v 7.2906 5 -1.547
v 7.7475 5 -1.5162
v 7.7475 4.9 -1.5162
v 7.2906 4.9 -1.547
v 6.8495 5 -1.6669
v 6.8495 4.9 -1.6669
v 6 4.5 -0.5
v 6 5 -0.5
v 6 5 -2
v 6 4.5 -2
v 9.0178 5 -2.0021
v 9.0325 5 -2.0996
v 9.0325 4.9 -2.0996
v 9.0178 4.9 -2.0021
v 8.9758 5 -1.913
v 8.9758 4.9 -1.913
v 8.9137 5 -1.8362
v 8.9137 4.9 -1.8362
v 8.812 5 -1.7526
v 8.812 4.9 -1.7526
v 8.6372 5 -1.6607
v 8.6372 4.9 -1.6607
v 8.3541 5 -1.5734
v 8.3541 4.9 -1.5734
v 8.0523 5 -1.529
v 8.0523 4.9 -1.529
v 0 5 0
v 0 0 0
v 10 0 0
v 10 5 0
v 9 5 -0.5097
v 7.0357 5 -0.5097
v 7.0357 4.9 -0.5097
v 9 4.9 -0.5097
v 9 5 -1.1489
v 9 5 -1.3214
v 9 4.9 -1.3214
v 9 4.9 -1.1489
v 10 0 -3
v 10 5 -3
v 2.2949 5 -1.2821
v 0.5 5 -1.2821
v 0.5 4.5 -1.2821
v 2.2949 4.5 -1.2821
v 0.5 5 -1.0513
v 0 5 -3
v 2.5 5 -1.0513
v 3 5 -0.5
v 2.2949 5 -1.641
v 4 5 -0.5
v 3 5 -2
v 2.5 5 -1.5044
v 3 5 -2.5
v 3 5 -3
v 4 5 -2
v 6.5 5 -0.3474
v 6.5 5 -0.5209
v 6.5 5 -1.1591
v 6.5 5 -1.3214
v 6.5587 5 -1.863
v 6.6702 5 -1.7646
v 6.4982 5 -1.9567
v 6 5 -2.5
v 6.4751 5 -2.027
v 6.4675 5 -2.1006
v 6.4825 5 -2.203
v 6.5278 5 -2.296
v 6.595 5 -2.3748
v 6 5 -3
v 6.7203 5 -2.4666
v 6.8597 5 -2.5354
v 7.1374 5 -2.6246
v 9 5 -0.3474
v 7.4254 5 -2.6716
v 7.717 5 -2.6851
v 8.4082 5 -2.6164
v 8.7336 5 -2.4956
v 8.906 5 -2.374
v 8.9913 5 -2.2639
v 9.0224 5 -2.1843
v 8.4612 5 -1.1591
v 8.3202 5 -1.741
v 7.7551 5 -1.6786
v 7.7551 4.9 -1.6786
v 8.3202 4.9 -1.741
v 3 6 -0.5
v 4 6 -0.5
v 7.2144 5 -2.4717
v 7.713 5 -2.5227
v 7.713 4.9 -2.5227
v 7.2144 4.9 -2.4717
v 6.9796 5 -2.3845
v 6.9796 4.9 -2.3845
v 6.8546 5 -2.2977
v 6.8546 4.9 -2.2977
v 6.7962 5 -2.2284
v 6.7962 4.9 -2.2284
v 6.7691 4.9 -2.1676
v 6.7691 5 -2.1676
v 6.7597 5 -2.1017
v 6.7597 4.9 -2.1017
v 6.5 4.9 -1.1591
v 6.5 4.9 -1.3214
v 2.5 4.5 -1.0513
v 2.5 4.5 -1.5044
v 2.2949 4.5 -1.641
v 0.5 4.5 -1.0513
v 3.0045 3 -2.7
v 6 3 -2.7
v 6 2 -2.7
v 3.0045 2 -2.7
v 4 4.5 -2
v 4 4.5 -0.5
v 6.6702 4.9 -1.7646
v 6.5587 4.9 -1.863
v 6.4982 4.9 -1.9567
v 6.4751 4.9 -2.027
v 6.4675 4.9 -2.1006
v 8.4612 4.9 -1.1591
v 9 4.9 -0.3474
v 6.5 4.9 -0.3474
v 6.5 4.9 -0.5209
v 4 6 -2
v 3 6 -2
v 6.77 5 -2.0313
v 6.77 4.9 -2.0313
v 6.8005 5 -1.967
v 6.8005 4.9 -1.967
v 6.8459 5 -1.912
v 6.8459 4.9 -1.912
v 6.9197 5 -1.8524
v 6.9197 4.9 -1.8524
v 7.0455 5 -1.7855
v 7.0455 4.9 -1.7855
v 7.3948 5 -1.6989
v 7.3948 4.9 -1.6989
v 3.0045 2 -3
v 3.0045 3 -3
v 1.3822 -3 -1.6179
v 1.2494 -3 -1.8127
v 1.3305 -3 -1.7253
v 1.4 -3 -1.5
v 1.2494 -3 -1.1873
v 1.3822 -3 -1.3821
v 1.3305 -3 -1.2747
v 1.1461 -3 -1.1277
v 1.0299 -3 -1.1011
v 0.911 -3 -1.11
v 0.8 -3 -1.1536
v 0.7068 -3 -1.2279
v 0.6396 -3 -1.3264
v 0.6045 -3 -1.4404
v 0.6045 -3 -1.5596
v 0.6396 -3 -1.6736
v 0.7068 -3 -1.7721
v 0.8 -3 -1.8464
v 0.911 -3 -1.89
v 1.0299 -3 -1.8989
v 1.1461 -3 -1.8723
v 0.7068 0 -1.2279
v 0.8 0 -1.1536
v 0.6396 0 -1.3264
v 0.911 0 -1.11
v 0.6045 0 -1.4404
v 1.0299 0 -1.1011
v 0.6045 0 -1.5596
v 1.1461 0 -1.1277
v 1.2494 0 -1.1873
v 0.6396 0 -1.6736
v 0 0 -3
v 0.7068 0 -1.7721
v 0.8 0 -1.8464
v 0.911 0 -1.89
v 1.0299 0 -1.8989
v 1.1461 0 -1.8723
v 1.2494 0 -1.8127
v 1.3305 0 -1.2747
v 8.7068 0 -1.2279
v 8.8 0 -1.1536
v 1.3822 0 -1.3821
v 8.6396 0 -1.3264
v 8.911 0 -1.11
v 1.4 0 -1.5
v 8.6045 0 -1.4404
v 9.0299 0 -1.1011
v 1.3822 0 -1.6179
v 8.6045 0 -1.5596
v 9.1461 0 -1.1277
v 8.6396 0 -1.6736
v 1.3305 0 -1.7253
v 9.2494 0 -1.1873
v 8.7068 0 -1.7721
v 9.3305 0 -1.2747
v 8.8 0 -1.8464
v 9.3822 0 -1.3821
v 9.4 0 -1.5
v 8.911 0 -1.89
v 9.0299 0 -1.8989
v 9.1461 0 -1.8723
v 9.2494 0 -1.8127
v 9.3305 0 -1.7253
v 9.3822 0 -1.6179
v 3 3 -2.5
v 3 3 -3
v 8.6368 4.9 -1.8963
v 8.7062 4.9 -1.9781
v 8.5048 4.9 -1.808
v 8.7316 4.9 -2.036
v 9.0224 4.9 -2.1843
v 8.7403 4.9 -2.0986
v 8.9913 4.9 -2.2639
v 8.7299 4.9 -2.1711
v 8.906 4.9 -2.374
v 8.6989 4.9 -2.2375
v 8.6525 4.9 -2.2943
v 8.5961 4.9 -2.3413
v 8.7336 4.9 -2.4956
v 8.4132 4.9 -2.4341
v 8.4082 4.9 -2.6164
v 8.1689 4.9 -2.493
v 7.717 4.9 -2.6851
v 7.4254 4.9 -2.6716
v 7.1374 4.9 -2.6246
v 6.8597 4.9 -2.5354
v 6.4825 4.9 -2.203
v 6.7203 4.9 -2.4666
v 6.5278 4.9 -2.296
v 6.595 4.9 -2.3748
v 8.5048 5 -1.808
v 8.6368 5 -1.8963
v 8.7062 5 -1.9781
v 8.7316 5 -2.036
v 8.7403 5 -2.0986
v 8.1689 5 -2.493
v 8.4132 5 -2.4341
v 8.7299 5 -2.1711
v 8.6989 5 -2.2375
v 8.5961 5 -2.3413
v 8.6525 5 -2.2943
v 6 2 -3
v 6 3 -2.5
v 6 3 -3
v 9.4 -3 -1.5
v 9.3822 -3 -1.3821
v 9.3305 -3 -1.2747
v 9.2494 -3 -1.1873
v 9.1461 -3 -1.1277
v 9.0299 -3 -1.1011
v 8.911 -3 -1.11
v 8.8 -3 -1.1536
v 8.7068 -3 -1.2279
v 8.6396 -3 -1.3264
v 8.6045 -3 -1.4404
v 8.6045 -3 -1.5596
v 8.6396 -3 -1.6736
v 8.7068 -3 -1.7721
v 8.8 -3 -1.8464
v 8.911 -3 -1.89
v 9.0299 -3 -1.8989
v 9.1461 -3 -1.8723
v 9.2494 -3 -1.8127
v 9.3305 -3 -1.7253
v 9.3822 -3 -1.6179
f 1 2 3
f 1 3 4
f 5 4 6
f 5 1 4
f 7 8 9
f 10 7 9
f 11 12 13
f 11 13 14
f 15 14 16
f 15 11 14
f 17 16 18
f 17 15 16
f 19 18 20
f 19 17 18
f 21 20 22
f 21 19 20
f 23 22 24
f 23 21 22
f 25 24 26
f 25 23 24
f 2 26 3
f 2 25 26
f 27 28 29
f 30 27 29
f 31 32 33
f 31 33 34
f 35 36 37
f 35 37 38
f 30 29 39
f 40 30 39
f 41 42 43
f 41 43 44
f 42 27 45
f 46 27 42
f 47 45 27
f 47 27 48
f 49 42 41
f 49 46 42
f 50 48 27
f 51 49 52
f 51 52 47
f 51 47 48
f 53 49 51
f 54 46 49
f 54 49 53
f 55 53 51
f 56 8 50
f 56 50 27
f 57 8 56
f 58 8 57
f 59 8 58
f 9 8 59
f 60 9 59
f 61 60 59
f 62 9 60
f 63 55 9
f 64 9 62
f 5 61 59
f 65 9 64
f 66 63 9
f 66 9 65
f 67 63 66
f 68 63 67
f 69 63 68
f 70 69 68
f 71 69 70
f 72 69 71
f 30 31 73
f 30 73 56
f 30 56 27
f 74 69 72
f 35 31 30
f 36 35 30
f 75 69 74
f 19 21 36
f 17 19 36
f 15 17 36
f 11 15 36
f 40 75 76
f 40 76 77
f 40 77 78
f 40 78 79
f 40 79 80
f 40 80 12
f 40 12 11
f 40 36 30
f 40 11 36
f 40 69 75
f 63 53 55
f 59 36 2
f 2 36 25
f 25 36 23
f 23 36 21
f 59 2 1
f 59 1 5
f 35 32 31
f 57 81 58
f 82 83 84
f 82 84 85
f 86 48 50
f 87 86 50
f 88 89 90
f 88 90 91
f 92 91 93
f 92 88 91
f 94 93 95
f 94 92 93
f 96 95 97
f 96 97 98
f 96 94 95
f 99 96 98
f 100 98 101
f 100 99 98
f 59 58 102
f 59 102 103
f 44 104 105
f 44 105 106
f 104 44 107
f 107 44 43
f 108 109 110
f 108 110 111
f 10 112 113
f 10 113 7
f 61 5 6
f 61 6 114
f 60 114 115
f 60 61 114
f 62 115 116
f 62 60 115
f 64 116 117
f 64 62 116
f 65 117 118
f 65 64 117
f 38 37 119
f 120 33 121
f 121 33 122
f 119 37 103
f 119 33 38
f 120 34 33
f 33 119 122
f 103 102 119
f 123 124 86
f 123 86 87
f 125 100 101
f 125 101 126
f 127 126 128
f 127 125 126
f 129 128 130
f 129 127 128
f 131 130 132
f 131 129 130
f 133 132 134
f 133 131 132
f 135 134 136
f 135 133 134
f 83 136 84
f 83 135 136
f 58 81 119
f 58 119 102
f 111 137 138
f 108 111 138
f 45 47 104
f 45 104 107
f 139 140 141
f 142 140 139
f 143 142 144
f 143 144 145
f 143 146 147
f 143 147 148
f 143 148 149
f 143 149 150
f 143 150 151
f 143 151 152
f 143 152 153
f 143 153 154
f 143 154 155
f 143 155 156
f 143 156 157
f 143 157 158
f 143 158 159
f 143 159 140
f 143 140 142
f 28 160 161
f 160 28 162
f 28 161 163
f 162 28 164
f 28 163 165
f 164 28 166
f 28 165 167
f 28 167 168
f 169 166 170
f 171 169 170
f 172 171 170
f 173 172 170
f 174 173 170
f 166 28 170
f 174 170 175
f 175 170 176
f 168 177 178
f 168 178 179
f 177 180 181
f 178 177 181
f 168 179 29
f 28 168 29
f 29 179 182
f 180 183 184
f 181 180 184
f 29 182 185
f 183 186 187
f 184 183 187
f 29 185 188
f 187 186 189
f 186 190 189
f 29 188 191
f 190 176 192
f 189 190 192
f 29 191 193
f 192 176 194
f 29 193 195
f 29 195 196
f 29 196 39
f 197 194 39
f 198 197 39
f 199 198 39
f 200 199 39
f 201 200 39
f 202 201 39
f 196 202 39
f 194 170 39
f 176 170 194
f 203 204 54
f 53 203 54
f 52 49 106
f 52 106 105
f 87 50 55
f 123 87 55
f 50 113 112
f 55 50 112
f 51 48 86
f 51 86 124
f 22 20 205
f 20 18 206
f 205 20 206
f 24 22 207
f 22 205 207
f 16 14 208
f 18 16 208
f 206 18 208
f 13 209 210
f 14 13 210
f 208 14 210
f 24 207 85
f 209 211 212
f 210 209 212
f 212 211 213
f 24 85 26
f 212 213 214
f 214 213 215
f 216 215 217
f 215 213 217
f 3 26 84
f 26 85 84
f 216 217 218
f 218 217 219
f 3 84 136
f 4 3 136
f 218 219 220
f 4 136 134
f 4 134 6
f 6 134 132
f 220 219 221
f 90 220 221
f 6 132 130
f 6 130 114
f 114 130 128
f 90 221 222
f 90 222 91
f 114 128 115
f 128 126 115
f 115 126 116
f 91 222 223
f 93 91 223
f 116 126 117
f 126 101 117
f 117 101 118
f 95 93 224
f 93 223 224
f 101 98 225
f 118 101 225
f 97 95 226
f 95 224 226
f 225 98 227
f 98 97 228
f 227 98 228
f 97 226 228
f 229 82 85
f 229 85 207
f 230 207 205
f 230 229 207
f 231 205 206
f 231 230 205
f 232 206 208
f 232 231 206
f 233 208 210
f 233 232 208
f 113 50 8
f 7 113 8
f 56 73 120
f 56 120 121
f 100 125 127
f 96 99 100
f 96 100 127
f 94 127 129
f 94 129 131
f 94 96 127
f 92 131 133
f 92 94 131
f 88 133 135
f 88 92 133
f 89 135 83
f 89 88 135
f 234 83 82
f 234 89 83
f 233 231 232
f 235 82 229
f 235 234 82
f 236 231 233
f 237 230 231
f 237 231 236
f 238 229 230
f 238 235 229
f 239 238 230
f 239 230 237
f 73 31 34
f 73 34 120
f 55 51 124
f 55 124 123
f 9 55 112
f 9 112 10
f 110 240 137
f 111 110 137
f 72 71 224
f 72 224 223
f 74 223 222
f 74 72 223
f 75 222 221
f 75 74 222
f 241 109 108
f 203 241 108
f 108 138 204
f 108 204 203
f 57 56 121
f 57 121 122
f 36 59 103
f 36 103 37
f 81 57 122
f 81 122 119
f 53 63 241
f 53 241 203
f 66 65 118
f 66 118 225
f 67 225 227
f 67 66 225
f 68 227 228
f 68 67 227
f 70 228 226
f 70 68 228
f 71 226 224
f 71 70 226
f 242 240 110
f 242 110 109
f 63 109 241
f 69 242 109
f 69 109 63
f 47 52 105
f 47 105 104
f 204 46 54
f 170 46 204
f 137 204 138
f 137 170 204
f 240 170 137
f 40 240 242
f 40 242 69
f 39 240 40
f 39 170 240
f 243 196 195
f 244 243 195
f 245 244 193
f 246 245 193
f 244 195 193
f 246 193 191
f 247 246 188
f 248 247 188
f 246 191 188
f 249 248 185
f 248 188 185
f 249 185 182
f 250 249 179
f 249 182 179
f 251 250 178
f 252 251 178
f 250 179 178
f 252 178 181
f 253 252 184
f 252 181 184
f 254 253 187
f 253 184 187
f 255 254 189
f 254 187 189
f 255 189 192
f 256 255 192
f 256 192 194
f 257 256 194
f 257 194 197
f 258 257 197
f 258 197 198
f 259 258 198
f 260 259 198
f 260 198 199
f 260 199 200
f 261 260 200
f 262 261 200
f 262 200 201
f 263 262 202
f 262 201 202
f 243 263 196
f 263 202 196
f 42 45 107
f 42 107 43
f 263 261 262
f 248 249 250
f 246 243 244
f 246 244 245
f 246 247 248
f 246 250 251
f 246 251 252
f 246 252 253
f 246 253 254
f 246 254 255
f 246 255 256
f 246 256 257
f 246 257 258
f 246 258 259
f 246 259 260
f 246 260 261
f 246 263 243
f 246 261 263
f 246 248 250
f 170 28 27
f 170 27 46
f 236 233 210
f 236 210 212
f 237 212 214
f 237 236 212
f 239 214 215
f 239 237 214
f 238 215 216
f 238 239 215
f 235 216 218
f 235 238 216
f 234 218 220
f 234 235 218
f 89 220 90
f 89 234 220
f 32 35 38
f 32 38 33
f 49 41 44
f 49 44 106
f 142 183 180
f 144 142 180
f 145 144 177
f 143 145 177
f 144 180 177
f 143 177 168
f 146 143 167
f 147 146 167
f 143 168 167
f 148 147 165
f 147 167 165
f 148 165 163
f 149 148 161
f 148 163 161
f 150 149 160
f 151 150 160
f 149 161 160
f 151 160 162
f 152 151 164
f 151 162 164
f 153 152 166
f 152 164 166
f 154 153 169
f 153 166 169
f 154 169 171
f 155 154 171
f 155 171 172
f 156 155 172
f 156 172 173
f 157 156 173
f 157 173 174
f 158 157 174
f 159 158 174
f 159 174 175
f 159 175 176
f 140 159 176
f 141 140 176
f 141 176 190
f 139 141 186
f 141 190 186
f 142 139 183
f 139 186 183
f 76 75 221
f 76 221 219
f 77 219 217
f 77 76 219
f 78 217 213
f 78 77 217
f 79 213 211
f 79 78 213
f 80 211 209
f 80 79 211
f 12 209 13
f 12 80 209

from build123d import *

# Parameters (mm, degrees)
ESBO_O1_W                = 10
ESBO_O1_H                = 3
RESSALTO_EXTRUS_O1_DEPTH = 5
ESBO_O4_W                = 1
ESBO_O4_H                = 1.5
RESSALTO_EXTRUS_O2_DEPTH = 1
ESBO_O8_W                = 2
ESBO_O8_H                = 1.5
CORTE_EXTRUS_O2_DEPTH    = 0.5
CORTE_EXTRUS_O5_DEPTH    = 0.1
CORTE_EXTRUS_O6_DEPTH    = 0.5
ESBO_O11_R               = 0.4
RESSALTO_EXTRUS_O4_DEPTH = 3
ESBO_O19_W               = 3
ESBO_O19_H               = 2
CORTE_EXTRUS_O9_DEPTH    = 0.5
ESBO_O21_W               = 2.995544047
ESBO_O21_H               = 1
CORTE_EXTRUS_O10_DEPTH   = 0.3


with BuildPart() as part:
    # Esboço1 → Ressalto-extrusão1 (new body)
    with BuildSketch(Plane(origin=(0, 0, 0), x_dir=(1, 0, 0), z_dir=(0, 1, 0))):
        with Locations((5, 1.5)):
            Rectangle(ESBO_O1_W, ESBO_O1_H)
    extrude(amount=RESSALTO_EXTRUS_O1_DEPTH)

    # Esboço4 → Ressalto-extrusão2 (add)
    with BuildSketch(Plane(origin=(0, 5, 0), x_dir=(1, 0, 0), z_dir=(0, 1, 0))):
        with Locations((3.5, 1.25)):
            Rectangle(ESBO_O4_W, ESBO_O4_H)
    extrude(amount=RESSALTO_EXTRUS_O2_DEPTH)

    # Esboço8 → Corte-extrusão2 (cut)
    with BuildSketch(Plane(origin=(0, 5, 0), x_dir=(1, 0, 0), z_dir=(0, 1, 0))):
        with Locations((5, 1.25)):
            Rectangle(ESBO_O8_W, ESBO_O8_H)
    extrude(amount=-CORTE_EXTRUS_O2_DEPTH, mode=Mode.SUBTRACT)

    # Esboço9 → Corte-extrusão5 (cut)
    with BuildSketch(Plane(origin=(0, 5, 0), x_dir=(1, 0, 0), z_dir=(0, 1, 0))):
        with BuildLine():
            add(Edge.make_bspline(
                [(7.717025162, 2.685064935), (7.768275073, 2.684653139), (7.867968532, 2.683852096), (8.012830606, 2.675522502), (8.148601104, 2.662599241), (8.275087284, 2.644432886), (8.392605867, 2.621489185), (8.500848932, 2.592511147), (8.600323781, 2.558959581), (8.689910066, 2.519182744), (8.770052693, 2.476635016), (8.839594359, 2.430662628), (8.899331263, 2.382896177), (8.947218272, 2.331040045), (8.986118217, 2.27759415), (9.012308422, 2.220411921), (9.029958288, 2.161052106), (9.031626399, 2.120222692), (9.032467532, 2.09963474)],
                knots=[0, 0, 0, 0, 0.000153734, 0.000299051, 0.000435142, 0.000562774, 0.000682263, 0.000794121, 0.000898722, 0.000996847, 0.001087864, 0.001170597, 0.00124666, 0.001316656, 0.001381822, 0.001444006, 0.001504562, 0.001566156, 0.001566156, 0.001566156, 0.001566156], degree=3))
            add(Edge.make_bspline(
                [(9.032467532, 2.09963474), (9.031952466, 2.086243406), (9.03092816, 2.059612265), (9.023519116, 2.020284156), (9.011816828, 1.98174038), (8.994996923, 1.944322939), (8.973326429, 1.907779642), (8.946647613, 1.872377676), (8.91588358, 1.837308554), (8.879929464, 1.803879089), (8.84003574, 1.771271209), (8.79508583, 1.741089795), (8.746201299, 1.712010826), (8.693008442, 1.684722634), (8.635338402, 1.659358364), (8.573479622, 1.635698049), (8.507410398, 1.613183974), (8.437075438, 1.593196089), (8.363020356, 1.57481891), (8.285320249, 1.559134103), (8.204039884, 1.546195816), (8.119518678, 1.534740096), (8.031299129, 1.526956469), (7.939792349, 1.520962638), (7.844740014, 1.516511464), (7.78027454, 1.516327433), (7.747463474, 1.516233766)],
                knots=[0, 0, 0, 0, 4.0157e-05, 7.986e-05, 0.000119657, 0.000160761, 0.00020261, 0.000246848, 0.000293569, 0.000342376, 0.000393954, 0.000447987, 0.000504626, 0.000564524, 0.000627211, 0.000693536, 0.000763161, 0.000836538, 0.000912823, 0.000992017, 0.001074251, 0.001159703, 0.001247841, 0.001339865, 0.001434818, 0.00153324, 0.00153324, 0.00153324, 0.00153324], degree=3))
            add(Edge.make_bspline(
                [(7.747463474, 1.516233766), (7.702642019, 1.51673791), (7.614970919, 1.517724018), (7.486687775, 1.524909023), (7.364657949, 1.536494006), (7.248954096, 1.552416836), (7.139735974, 1.573715014), (7.036976444, 1.599695769), (6.940209946, 1.629432703), (6.87929448, 1.654605061), (6.849533279, 1.666903409)],
                knots=[0, 0, 0, 0, 0.00013446, 0.000263004, 0.000385315, 0.000502115, 0.000613247, 0.000718938, 0.000820018, 0.000916578, 0.000916578, 0.000916578, 0.000916578], degree=3))
            add(Edge.make_bspline(
                [(6.849533279, 1.666903409), (6.819495721, 1.680737693), (6.762099909, 1.707172265), (6.684107261, 1.753561383), (6.617281662, 1.802485084), (6.562765507, 1.855474257), (6.520316361, 1.9119252), (6.489575578, 1.97162645), (6.471096623, 2.035136967), (6.468725659, 2.078717419), (6.467532468, 2.100649351)],
                knots=[0, 0, 0, 0, 9.9153e-05, 0.000189462, 0.000271747, 0.000347082, 0.000416684, 0.000482706, 0.000547582, 0.000613307, 0.000613307, 0.000613307, 0.000613307], degree=3))
            add(Edge.make_bspline(
                [(6.467532468, 2.100649351), (6.468673515, 2.122760058), (6.470934698, 2.166576254), (6.490149361, 2.23047144), (6.521930555, 2.290377771), (6.565195504, 2.347502443), (6.621476513, 2.400294414), (6.689828213, 2.449371296), (6.769790362, 2.49578785), (6.828783463, 2.521791334), (6.859679383, 2.535409903)],
                knots=[0, 0, 0, 0, 6.623e-05, 0.000131246, 0.000198184, 0.000268801, 0.000345229, 0.000428739, 0.000520798, 0.000622027, 0.000622027, 0.000622027, 0.000622027], degree=3))
            add(Edge.make_bspline(
                [(6.859679383, 2.535409903), (6.889983671, 2.547446904), (6.951310735, 2.571806293), (7.047289586, 2.602023308), (7.147652813, 2.628051521), (7.252801276, 2.648342721), (7.36221225, 2.665485653), (7.476356384, 2.676921818), (7.595195642, 2.68340278), (7.675925466, 2.6845042), (7.717025162, 2.685064935)],
                knots=[0, 0, 0, 0, 9.7794e-05, 0.000197907, 0.000301632, 0.000408684, 0.000519032, 0.000633771, 0.000752663, 0.000875964, 0.000875964, 0.000875964, 0.000875964], degree=3))
        make_face()
        with BuildLine():
            add(Edge.make_bspline(
                [(7.712966721, 2.522727273), (7.676265876, 2.522308225), (7.605018602, 2.52149473), (7.50124071, 2.516066621), (7.403787401, 2.506272361), (7.312351828, 2.493718156), (7.227668706, 2.475551712), (7.149030594, 2.455141256), (7.076719376, 2.430343071), (7.011040089, 2.401515886), (6.952378669, 2.370275717), (6.901011675, 2.337541762), (6.858096688, 2.302123084), (6.822086823, 2.265855819), (6.794084242, 2.227459146), (6.774410061, 2.1871143), (6.762168952, 2.14498675), (6.760550491, 2.116116802), (6.75974026, 2.101663961)],
                knots=[0, 0, 0, 0, 0.000110104, 0.000213745, 0.000311623, 0.000403886, 0.000490446, 0.000571292, 0.000647498, 0.000719509, 0.000786234, 0.00084674, 0.000901887, 0.00095283, 0.000999714, 0.00104373, 0.001086934, 0.001130246, 0.001130246, 0.001130246, 0.001130246], degree=3))
            add(Edge.make_bspline(
                [(6.75974026, 2.101663961), (6.760546361, 2.08687607), (6.762147128, 2.057510041), (6.774313031, 2.014588099), (6.794620069, 1.973819375), (6.82312444, 1.935125343), (6.858951297, 1.897980531), (6.902606815, 1.862790076), (6.954424216, 1.830037922), (7.013593655, 1.798559592), (7.080701403, 1.770420052), (7.15507718, 1.745439683), (7.237089191, 1.7250245), (7.326311037, 1.707753487), (7.423058943, 1.694892365), (7.527126513, 1.685211994), (7.638673744, 1.679804459), (7.715497711, 1.678990654), (7.755073052, 1.678571429)],
                knots=[0, 0, 0, 0, 4.4322e-05, 8.8015e-05, 0.00013271, 0.000180302, 0.00023161, 0.00028715, 0.000348081, 0.000415255, 0.000487996, 0.000566123, 0.000650406, 0.000741342, 0.000838628, 0.000943072, 0.001054818, 0.001173545, 0.001173545, 0.001173545, 0.001173545], degree=3))
            add(Edge.make_bspline(
                [(7.755073052, 1.678571429), (7.806337615, 1.67933264), (7.906298407, 1.680816928), (8.051928946, 1.692847075), (8.189578018, 1.711140794), (8.277380562, 1.731189916), (8.320211039, 1.740969968)],
                knots=[0, 0, 0, 0, 0.000153767, 0.00029983, 0.000438153, 0.000569888, 0.000569888, 0.000569888, 0.000569888], degree=3))
            add(Edge.make_bspline(
                [(8.320211039, 1.740969968), (8.350692489, 1.749465777), (8.409390915, 1.765826239), (8.490866203, 1.799714474), (8.563441842, 1.83845794), (8.625079395, 1.883949286), (8.675708543, 1.933016459), (8.713082539, 1.985414753), (8.736039938, 2.041202632), (8.738865882, 2.07965435), (8.74025974, 2.09862013)],
                knots=[0, 0, 0, 0, 9.485e-05, 0.000182653, 0.000264154, 0.000341064, 0.000411733, 0.000474779, 0.000533093, 0.00058985, 0.00058985, 0.00058985, 0.00058985], degree=3))
            add(Edge.make_bspline(
                [(8.74025974, 2.09862013), (8.739452698, 2.113743816), (8.737850374, 2.143770825), (8.725711477, 2.187701113), (8.705482151, 2.229237127), (8.67758473, 2.268647264), (8.642026485, 2.305993002), (8.598385597, 2.341015015), (8.546814492, 2.373728066), (8.487776446, 2.404835686), (8.420389396, 2.432702421), (8.344485848, 2.456804565), (8.260267259, 2.477516021), (8.167366142, 2.493969498), (8.065977549, 2.507157629), (7.955920014, 2.515874448), (7.837316624, 2.521580425), (7.755418511, 2.522335751), (7.712966721, 2.522727273)],
                knots=[0, 0, 0, 0, 4.5332e-05, 9.0004e-05, 0.000135611, 0.000183322, 0.00023428, 0.00028982, 0.000350751, 0.000417239, 0.000489784, 0.000569198, 0.000655941, 0.000749776, 0.000852091, 0.000962554, 0.001080888, 0.001208238, 0.001208238, 0.001208238, 0.001208238], degree=3))
        make_face(mode=Mode.SUBTRACT)
        Polygon((6.5, 1.321428571), (9, 1.321428571), (9, 1.148944805), (7.035714286, 0.50974026), (9, 0.50974026), (9, 0.347402597), (6.5, 0.347402597), (6.5, 0.520900974), (8.461241883, 1.159090909), (6.5, 1.159090909), align=None)
    extrude(amount=-CORTE_EXTRUS_O5_DEPTH, mode=Mode.SUBTRACT)

    # Esboço10 → Corte-extrusão6 (cut)
    with BuildSketch(Plane(origin=(0, 5, 0), x_dir=(1, 0, 0), z_dir=(0, 1, 0))):
        Polygon((2.5, 1.504407051), (2.5, 1.051282051), (0.5, 1.051282051), (0.5, 1.282051282), (2.294871795, 1.282051282), (2.294871795, 1.641025641), align=None)
    extrude(amount=-CORTE_EXTRUS_O6_DEPTH, mode=Mode.SUBTRACT)

    # Esboço11 → Ressalto-extrusão4 (add)
    with BuildSketch(Plane.XZ):
        with Locations((1, -1.5)):
            Circle(ESBO_O11_R)
        with Locations((9, -1.5)):
            Circle(ESBO_O11_R)
    extrude(amount=RESSALTO_EXTRUS_O4_DEPTH)

    # Esboço19 → Corte-extrusão9 (cut)
    with BuildSketch(Plane(origin=(0, 0, -3), x_dir=(-1, 0, 0), z_dir=(0, 0, -1))):
        with Locations((-4.5, 4)):
            Rectangle(ESBO_O19_W, ESBO_O19_H)
    extrude(amount=-CORTE_EXTRUS_O9_DEPTH, mode=Mode.SUBTRACT)

    # Esboço21 → Corte-extrusão10 (cut)
    with BuildSketch(Plane(origin=(0, 0, -3), x_dir=(-1, 0, 0), z_dir=(0, 0, -1))):
        with Locations((-4.502227977, 2.5)):
            Rectangle(ESBO_O21_W, ESBO_O21_H)
    extrude(amount=-CORTE_EXTRUS_O10_DEPTH, mode=Mode.SUBTRACT)


solid = part.part
